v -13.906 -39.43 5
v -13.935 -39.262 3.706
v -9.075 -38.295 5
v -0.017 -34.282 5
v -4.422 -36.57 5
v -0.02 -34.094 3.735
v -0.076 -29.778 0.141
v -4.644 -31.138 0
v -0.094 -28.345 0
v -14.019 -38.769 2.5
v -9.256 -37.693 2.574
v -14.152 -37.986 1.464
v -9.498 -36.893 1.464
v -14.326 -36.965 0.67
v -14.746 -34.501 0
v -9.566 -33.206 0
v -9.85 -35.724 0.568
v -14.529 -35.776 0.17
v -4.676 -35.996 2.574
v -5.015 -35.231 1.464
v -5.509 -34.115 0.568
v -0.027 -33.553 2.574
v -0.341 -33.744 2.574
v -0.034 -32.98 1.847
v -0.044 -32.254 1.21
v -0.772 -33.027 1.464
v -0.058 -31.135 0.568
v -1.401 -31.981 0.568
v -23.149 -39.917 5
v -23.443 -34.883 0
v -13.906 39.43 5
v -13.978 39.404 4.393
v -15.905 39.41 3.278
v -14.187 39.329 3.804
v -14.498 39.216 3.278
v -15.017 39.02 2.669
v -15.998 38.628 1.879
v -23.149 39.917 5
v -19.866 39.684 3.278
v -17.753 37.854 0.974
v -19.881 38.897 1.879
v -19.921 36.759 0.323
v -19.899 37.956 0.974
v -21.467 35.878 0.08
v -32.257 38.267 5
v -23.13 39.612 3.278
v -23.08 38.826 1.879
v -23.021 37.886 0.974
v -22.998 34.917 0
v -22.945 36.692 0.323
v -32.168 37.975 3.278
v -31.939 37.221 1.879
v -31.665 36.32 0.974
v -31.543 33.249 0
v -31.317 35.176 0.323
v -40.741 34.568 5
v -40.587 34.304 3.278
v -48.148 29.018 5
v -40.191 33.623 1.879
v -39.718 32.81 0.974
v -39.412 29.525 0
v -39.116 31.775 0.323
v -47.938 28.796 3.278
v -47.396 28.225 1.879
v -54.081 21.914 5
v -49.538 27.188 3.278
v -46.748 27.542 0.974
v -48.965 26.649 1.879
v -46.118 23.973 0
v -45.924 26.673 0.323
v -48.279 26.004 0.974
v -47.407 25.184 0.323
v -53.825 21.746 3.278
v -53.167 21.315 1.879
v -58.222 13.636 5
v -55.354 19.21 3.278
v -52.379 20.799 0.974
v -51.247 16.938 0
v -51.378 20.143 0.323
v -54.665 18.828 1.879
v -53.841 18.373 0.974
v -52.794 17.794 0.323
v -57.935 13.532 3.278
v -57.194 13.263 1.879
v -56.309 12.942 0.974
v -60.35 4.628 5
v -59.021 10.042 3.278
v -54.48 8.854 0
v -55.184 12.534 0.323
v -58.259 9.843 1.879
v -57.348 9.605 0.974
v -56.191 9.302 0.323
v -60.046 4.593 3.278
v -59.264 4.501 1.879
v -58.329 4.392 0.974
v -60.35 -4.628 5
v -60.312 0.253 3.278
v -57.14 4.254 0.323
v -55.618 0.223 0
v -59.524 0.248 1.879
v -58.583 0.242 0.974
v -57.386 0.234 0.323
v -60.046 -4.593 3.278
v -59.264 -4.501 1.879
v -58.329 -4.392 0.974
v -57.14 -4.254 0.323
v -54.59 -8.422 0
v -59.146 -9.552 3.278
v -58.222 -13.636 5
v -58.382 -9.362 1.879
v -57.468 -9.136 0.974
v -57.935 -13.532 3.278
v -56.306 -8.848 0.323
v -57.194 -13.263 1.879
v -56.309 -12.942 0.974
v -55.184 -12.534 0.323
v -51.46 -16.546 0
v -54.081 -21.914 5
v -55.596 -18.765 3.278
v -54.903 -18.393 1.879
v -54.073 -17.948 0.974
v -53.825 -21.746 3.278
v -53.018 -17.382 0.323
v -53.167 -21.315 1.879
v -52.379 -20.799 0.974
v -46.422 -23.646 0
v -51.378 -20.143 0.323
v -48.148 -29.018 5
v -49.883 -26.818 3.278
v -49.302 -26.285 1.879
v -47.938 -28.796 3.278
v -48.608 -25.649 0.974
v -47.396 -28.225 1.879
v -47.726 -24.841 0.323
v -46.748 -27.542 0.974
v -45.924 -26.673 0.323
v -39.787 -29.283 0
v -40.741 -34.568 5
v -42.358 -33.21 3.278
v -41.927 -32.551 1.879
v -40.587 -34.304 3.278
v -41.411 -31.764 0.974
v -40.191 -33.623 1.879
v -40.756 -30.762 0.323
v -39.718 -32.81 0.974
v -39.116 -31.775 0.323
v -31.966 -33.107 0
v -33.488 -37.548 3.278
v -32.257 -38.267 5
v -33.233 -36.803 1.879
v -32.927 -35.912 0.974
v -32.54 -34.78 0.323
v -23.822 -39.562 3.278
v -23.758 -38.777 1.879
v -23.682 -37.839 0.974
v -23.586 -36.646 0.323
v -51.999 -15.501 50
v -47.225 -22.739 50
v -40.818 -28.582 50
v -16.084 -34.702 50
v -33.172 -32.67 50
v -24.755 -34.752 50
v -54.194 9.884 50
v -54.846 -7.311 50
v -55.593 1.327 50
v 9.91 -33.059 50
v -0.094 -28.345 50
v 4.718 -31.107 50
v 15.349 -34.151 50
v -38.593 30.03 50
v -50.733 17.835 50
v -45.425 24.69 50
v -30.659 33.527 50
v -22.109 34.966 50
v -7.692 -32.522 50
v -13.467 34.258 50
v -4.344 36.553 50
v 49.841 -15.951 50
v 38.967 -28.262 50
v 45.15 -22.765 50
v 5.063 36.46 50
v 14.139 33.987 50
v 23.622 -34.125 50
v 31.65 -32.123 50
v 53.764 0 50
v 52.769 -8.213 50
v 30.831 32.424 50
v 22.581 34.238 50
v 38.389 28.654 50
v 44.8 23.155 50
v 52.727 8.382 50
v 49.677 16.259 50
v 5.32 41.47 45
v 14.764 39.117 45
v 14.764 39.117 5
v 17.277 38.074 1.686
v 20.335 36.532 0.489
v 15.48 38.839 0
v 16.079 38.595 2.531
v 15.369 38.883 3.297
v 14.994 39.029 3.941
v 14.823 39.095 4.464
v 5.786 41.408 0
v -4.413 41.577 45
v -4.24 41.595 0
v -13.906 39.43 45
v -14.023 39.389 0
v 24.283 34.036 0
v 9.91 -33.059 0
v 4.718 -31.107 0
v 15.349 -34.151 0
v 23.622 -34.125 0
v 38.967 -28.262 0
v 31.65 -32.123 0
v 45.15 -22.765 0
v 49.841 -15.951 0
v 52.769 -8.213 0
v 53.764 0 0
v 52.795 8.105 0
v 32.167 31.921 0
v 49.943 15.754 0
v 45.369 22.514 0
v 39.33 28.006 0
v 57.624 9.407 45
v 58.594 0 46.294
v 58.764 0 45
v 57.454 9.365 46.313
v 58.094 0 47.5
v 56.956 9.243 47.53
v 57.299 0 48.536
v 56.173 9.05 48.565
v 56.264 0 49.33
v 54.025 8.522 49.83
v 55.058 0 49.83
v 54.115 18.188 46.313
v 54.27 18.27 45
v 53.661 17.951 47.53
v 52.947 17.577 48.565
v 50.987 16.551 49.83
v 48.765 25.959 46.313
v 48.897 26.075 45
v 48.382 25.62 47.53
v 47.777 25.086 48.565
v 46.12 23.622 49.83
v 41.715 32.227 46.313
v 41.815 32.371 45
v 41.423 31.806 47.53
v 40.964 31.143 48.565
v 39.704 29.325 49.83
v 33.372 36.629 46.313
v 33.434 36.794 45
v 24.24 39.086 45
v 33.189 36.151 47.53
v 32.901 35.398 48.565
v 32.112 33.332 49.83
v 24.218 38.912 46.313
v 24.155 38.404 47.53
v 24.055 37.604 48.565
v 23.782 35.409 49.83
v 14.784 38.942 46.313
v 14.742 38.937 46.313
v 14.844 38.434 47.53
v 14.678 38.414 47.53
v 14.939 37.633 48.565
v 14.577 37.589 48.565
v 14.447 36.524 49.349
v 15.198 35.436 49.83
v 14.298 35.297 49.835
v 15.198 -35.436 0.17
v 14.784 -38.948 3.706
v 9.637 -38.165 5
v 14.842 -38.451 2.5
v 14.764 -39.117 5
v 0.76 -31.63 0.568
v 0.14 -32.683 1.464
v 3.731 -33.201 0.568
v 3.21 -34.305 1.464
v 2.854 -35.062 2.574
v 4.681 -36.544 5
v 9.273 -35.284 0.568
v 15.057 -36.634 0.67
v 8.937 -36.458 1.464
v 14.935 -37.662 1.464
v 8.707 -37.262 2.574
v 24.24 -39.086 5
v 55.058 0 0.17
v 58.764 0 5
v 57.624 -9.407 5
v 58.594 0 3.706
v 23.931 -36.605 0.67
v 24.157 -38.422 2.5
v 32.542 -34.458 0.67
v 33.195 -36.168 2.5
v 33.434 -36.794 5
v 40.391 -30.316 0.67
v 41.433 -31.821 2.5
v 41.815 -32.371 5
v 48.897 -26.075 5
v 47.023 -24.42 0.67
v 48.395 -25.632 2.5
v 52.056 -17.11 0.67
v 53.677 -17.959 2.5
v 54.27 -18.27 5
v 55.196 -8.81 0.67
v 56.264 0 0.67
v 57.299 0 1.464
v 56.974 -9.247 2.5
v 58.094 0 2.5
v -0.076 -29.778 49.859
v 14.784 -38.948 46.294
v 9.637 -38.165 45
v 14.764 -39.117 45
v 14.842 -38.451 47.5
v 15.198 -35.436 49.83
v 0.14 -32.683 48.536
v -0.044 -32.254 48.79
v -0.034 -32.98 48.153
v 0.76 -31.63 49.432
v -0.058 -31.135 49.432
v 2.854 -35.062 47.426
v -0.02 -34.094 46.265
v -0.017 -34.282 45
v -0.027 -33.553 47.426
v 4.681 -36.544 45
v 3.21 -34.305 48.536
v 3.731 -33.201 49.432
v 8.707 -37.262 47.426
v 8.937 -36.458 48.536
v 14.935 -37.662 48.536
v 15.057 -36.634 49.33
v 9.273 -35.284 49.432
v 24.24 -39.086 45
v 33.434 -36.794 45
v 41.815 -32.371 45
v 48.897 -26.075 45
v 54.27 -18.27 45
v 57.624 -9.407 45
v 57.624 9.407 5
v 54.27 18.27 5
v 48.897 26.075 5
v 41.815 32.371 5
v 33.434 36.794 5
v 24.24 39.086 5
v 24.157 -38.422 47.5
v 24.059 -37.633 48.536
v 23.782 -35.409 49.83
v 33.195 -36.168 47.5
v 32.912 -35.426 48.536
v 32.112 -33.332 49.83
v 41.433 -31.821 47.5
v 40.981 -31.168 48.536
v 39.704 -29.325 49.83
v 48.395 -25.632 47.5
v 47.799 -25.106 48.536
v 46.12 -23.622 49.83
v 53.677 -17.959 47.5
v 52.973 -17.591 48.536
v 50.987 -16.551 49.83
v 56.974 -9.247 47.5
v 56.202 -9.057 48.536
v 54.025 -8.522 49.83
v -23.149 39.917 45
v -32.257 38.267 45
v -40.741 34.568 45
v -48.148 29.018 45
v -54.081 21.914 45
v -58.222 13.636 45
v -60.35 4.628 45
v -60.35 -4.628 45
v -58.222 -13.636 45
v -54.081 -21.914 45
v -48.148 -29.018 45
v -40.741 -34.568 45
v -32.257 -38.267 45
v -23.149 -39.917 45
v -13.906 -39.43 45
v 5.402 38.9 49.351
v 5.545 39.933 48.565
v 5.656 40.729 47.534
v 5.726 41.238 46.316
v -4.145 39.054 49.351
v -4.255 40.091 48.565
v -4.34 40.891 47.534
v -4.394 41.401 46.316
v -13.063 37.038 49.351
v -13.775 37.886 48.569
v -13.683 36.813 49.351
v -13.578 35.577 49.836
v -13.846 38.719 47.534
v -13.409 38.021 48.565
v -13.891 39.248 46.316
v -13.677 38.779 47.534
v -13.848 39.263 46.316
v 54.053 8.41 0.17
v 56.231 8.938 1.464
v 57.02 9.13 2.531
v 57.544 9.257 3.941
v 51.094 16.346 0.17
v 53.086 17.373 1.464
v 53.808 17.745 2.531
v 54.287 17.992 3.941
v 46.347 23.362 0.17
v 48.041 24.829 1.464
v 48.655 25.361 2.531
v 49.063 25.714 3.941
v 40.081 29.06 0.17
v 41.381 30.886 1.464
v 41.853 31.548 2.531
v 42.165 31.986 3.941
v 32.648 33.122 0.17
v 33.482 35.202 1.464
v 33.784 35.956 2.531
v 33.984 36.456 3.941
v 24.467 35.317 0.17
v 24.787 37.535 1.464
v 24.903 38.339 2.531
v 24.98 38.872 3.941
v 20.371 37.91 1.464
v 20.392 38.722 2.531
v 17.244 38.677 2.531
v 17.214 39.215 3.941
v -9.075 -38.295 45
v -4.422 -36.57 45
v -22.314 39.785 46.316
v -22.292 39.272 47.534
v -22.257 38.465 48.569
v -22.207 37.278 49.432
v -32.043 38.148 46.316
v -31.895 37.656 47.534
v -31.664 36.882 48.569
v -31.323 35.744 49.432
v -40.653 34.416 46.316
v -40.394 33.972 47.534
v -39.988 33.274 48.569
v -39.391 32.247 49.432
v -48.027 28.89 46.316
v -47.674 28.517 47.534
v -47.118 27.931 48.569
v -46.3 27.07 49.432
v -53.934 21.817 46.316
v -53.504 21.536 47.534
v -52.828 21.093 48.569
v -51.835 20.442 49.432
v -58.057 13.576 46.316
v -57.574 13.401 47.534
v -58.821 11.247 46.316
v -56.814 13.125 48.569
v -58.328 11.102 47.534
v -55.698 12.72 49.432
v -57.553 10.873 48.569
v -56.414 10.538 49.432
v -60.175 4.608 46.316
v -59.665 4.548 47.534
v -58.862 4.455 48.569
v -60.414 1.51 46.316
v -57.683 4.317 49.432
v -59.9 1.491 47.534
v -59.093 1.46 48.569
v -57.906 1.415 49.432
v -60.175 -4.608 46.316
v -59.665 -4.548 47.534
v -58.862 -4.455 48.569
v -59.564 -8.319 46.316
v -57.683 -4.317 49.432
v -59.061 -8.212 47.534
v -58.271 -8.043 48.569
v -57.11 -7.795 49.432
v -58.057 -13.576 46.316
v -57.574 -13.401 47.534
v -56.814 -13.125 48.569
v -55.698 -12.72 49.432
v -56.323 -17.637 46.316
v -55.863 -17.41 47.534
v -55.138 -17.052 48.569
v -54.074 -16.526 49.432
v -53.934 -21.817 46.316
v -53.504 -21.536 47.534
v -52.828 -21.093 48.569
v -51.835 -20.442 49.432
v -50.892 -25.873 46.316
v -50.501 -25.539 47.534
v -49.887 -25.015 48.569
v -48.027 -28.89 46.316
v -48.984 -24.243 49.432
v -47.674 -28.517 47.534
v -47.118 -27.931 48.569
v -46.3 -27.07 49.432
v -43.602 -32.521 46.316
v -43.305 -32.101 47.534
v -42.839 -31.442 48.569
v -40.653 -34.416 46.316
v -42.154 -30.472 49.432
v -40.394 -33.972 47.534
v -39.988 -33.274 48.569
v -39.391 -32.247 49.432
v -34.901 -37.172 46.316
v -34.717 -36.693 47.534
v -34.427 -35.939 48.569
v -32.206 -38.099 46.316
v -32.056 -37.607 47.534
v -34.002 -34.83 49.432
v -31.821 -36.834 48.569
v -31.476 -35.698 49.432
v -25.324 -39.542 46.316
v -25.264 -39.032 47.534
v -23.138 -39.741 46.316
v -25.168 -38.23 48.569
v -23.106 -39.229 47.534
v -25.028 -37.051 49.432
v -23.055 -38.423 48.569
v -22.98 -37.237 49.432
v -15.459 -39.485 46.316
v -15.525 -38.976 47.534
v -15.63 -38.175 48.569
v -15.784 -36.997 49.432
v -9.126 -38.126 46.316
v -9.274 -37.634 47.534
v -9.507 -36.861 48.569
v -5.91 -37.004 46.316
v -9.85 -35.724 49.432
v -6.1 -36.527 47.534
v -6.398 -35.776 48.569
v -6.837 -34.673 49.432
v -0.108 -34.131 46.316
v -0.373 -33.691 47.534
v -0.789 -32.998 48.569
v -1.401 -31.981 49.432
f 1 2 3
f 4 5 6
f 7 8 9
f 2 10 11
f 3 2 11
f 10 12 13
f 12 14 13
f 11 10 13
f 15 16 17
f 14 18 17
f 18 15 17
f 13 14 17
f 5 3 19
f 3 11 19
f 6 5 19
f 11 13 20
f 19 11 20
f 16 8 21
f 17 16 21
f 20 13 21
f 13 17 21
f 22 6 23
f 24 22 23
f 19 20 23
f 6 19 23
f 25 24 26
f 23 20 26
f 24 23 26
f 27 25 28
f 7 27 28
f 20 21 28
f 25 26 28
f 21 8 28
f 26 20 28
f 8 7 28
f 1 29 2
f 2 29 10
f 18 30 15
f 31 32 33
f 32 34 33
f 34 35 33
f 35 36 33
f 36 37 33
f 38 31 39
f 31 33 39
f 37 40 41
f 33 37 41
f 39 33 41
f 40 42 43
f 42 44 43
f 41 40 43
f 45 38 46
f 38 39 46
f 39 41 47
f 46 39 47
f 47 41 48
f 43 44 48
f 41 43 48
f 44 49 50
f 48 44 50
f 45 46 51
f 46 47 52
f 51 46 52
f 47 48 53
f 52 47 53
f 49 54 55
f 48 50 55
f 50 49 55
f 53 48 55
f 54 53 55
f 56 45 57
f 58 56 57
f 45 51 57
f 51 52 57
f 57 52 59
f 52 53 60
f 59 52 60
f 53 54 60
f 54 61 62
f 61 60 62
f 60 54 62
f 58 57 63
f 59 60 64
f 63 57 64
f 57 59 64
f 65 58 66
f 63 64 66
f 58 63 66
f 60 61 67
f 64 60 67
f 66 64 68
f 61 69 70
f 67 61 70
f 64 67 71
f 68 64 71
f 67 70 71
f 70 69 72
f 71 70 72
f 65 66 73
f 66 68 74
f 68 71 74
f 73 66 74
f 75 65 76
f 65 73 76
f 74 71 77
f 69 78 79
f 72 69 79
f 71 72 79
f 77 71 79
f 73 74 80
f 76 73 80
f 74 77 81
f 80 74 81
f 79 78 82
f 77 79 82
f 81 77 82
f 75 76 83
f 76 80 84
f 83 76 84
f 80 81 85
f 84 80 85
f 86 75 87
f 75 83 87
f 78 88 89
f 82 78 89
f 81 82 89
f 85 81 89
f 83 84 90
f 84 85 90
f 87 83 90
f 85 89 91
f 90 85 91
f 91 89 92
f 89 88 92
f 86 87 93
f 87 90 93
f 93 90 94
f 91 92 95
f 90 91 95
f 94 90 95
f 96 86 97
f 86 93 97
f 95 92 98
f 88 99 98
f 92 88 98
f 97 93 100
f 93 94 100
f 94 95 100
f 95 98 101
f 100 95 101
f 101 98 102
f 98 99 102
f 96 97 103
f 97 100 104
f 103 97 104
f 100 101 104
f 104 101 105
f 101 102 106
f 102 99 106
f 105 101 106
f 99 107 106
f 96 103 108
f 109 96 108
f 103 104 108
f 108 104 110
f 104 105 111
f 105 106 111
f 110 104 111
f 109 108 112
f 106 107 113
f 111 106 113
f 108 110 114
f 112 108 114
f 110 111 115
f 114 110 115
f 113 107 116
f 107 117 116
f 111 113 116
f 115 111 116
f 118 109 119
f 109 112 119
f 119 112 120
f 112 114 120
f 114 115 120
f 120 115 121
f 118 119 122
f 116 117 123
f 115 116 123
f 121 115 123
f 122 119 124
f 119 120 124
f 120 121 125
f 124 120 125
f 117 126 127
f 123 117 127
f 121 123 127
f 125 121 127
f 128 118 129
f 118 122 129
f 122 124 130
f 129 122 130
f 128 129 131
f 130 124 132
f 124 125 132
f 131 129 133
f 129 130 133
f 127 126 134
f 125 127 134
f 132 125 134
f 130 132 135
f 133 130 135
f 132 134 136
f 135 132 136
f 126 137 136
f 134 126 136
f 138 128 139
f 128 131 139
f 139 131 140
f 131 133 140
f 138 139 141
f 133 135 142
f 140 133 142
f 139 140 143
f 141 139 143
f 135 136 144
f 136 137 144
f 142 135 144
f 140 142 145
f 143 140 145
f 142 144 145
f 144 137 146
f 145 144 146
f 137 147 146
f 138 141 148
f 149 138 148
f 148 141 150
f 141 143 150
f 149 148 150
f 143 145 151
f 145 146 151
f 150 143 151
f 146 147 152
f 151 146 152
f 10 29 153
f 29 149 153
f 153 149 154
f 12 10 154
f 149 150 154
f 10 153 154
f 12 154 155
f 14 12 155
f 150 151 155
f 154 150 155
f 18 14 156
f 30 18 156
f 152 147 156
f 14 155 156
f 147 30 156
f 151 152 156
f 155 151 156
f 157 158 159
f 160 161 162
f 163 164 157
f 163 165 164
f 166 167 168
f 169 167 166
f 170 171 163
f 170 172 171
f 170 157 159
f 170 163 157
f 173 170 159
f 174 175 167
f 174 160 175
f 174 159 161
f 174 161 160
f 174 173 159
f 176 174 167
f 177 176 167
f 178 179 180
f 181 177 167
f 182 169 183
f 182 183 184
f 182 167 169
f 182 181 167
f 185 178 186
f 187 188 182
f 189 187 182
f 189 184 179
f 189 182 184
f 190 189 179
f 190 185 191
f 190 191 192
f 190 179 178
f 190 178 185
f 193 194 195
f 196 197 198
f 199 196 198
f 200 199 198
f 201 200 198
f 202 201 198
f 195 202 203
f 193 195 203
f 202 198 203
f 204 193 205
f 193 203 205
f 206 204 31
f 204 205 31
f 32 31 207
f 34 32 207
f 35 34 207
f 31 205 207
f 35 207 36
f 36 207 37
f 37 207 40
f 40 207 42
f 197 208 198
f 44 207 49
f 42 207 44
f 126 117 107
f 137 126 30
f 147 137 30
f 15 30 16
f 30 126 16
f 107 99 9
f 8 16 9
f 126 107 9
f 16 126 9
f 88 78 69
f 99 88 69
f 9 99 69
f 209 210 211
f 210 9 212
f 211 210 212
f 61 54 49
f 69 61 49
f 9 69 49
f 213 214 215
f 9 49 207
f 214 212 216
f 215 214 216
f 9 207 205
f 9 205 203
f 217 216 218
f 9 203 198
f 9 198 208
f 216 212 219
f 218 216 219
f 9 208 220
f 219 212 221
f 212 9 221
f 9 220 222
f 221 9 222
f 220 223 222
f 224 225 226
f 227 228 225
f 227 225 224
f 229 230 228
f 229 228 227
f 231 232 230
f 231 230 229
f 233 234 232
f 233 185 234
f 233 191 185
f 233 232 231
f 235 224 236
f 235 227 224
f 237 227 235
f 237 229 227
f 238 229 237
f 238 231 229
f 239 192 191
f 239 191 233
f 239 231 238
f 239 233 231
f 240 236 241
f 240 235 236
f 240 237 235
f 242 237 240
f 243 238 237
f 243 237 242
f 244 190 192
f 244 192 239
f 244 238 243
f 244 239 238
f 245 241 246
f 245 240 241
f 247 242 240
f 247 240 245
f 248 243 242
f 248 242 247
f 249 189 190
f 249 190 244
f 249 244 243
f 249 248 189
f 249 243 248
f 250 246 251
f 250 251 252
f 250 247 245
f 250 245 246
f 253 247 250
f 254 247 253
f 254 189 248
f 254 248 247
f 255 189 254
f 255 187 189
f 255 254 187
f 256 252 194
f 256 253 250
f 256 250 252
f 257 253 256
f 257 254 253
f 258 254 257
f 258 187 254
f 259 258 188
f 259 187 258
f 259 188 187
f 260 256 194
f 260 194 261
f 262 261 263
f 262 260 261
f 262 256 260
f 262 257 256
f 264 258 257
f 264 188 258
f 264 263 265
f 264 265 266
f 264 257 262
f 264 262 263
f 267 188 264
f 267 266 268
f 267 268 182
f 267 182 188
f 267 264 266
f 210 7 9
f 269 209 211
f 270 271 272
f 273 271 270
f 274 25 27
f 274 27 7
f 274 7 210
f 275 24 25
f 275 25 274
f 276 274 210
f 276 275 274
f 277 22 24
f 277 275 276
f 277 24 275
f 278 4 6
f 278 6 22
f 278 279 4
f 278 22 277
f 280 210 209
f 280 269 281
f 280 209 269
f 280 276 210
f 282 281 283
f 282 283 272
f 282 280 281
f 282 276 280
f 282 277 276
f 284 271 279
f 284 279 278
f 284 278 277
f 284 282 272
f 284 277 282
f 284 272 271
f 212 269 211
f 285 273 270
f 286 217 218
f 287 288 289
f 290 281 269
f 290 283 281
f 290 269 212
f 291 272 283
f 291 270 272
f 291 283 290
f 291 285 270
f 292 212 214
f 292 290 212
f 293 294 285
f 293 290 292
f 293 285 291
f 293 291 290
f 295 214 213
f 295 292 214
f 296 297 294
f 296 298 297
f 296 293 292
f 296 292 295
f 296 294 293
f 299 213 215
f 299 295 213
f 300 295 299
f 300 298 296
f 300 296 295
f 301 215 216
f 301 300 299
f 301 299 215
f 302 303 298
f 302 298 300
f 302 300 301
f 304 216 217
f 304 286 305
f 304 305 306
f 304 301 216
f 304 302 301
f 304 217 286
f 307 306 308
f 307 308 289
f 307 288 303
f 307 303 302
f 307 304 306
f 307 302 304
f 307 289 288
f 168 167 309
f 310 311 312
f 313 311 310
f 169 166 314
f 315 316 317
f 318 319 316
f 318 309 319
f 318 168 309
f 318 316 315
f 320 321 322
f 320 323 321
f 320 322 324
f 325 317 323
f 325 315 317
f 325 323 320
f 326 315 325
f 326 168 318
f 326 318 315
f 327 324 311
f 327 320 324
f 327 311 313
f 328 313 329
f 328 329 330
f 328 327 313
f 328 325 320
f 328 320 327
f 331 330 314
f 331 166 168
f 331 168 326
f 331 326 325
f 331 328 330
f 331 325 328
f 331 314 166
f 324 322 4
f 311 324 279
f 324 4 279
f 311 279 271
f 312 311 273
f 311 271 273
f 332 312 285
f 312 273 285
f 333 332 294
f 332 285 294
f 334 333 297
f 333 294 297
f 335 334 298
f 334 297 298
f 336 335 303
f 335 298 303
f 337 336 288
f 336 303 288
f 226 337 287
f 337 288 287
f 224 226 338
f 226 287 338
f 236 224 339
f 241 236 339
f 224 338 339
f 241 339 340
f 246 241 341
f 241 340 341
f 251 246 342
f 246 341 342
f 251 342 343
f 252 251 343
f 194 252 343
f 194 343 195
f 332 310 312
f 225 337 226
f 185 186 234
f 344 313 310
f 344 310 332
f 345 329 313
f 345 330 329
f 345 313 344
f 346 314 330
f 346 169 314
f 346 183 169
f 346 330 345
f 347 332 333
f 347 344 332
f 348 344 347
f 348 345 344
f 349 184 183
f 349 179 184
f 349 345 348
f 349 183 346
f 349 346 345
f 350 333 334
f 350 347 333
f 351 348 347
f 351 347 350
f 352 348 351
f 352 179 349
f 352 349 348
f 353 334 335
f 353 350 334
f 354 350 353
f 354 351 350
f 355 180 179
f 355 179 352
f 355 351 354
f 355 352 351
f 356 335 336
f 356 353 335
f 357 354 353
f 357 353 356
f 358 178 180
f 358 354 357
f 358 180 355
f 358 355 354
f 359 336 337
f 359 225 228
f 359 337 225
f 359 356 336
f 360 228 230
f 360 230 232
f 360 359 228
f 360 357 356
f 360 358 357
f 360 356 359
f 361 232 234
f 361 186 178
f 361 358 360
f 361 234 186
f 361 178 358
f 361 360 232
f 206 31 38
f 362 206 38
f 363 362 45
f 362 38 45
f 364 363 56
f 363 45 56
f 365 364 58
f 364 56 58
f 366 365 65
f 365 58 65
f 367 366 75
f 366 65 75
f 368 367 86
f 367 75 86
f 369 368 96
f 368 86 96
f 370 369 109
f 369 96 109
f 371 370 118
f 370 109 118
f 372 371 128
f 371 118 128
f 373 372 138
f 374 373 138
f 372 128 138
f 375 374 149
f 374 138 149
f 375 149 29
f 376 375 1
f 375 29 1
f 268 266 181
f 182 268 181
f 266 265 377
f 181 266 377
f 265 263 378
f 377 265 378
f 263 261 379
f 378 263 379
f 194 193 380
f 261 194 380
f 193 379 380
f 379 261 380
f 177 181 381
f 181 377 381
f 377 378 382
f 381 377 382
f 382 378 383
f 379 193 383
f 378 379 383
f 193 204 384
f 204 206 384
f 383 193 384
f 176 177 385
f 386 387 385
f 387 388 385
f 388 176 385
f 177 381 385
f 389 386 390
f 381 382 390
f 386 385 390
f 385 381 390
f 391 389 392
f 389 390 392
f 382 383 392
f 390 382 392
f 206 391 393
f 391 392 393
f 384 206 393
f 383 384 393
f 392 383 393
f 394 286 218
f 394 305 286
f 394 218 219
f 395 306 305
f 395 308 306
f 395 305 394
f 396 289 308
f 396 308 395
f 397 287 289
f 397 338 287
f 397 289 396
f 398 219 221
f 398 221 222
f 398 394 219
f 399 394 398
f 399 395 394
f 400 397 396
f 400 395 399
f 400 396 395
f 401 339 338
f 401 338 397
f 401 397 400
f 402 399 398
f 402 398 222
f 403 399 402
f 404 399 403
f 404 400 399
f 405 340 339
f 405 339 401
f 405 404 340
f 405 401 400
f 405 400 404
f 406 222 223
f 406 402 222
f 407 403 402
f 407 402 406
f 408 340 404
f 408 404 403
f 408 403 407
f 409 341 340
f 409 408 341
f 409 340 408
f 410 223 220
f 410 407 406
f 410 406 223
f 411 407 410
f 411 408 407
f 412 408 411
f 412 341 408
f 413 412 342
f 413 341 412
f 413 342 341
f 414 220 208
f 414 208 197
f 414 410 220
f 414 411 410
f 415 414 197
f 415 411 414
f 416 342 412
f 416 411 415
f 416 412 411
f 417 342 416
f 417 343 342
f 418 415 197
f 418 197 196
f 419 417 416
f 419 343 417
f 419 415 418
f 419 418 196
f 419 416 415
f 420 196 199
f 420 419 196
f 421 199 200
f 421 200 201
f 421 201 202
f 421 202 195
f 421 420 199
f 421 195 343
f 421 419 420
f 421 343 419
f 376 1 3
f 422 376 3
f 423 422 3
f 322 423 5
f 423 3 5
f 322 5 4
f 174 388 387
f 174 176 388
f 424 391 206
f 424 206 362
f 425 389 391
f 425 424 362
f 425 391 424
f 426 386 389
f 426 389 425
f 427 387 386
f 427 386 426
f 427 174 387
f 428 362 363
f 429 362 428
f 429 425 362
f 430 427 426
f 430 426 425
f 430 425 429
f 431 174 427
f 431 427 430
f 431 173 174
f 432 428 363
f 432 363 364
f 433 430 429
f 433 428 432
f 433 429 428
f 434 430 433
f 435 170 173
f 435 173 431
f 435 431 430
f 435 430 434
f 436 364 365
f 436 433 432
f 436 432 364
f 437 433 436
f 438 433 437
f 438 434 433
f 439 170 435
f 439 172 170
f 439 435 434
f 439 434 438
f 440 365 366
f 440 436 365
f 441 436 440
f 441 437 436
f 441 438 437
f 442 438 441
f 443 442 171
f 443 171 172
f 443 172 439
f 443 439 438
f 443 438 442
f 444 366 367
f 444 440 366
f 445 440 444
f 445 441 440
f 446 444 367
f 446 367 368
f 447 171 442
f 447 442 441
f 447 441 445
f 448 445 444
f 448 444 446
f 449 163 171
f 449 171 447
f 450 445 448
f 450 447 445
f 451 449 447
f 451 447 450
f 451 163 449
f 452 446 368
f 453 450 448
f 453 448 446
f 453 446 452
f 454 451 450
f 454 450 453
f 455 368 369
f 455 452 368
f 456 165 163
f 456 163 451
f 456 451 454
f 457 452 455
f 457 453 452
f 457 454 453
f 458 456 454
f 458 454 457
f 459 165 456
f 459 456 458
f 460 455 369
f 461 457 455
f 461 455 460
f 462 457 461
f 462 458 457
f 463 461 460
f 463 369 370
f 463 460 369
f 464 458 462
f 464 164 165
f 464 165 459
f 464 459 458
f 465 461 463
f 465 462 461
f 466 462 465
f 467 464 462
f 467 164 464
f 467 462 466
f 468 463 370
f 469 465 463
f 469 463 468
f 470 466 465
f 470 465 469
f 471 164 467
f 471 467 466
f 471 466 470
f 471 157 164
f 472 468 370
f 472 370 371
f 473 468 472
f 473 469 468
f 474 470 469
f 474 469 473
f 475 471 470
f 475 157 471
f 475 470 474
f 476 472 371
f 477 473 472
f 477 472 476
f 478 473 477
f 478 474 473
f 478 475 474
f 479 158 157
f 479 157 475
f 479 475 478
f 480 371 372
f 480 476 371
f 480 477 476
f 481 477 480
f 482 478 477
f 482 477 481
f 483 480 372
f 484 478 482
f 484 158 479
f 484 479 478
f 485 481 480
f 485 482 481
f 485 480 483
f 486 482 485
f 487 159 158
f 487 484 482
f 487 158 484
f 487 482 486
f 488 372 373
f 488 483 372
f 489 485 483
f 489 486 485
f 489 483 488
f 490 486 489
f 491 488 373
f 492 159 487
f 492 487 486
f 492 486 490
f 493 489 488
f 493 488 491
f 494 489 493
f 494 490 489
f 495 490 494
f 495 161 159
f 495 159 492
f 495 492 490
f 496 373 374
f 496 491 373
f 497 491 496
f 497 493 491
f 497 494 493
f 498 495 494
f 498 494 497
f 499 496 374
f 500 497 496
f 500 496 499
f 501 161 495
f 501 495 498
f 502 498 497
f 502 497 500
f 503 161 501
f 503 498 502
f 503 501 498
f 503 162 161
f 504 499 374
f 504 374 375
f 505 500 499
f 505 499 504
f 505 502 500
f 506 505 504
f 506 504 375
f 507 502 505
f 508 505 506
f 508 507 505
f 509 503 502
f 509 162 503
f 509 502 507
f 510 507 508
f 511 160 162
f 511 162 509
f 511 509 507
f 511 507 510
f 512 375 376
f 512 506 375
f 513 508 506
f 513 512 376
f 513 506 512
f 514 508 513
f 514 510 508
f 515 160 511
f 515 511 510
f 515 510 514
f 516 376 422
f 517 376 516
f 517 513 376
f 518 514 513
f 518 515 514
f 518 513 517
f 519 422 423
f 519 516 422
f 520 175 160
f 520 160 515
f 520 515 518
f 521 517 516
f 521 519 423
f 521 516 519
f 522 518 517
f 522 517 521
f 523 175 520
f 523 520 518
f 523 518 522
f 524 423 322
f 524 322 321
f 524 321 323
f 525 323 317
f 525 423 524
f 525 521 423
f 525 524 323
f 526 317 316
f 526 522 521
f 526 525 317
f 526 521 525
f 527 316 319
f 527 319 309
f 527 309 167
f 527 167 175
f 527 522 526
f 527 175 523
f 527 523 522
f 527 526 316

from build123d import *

# Parameters (mm, degrees)
F1_DEPTH = 25
F2_DEPTH = 25
F3_R     = 5


with BuildPart() as f1:
    # F0 (on Top) → F1 (new body)
    with BuildSketch(Plane.XY):
        with BuildLine():
            ThreePointArc((-13.9063807078, -39.4297258268), (-41.8101746369, 0), (-13.9063807078, 39.4297258268))
            ThreePointArc((-13.9063807078, 39.4297258268), (-60.6185237596, 0), (-13.9063807078, -39.4297258268))
        make_face()
        with BuildLine():
            ThreePointArc((-0.0174014932, 34.2823190322), (-6.7215345173, 37.5045640586), (-13.9063807078, 39.4297258268))
            ThreePointArc((-13.9063807078, 39.4297258268), (-41.8101746369, 0), (-13.9063807078, -39.4297258268))
            ThreePointArc((-13.9063807078, -39.4297258268), (-6.7215345173, -37.5045640586), (-0.0174014932, -34.2823190322))
            ThreePointArc((-0.0174014932, -34.2823190322), (-20.0114496486, 0), (-0.0174014932, 34.2823190322))
        make_face()
        with BuildLine():
            ThreePointArc((19.3762558232, 0), (14.1918428442, 19.6938527359), (-0.0174014932, 34.2823190322))
            ThreePointArc((-0.0174014932, 34.2823190322), (-20.0114496486, 0), (-0.0174014932, -34.2823190322))
            ThreePointArc((-0.0174014932, -34.2823190322), (14.1918428442, -19.6938527359), (19.3762558232, 0))
        make_face()
        with BuildLine():
            ThreePointArc((14.7639114539, -39.1167179317), (34.3902051417, -23.7782357099), (41.8101746369, 0))
            ThreePointArc((41.8101746369, 0), (34.3902051417, 23.7782357099), (14.7639114539, 39.1167179317))
            ThreePointArc((14.7639114539, 39.1167179317), (7.1322825133, 37.4362986941), (-0.0174014932, 34.2823190322))
            ThreePointArc((-0.0174014932, 34.2823190322), (14.1918428442, 19.6938527359), (19.3762558232, 0))
            ThreePointArc((19.3762558232, 0), (14.1918428442, -19.6938527359), (-0.0174014932, -34.2823190322))
            ThreePointArc((-0.0174014932, -34.2823190322), (7.1322825133, -37.4362986941), (14.7639114539, -39.1167179317))
        make_face()
        with BuildLine():
            ThreePointArc((14.7639114539, 39.1167179317), (34.3902051417, 23.7782357099), (41.8101746369, 0))
            ThreePointArc((41.8101746369, 0), (34.3902051417, -23.7782357099), (14.7639114539, -39.1167179317))
            ThreePointArc((14.7639114539, -39.1167179317), (45.546101837, -29.436890154), (58.7639612949, 0))
            ThreePointArc((58.7639612949, 0), (45.546101837, 29.436890154), (14.7639114539, 39.1167179317))
        make_face()
        with BuildLine():
            ThreePointArc((-0.0174014932, 34.2823190322), (7.1322825133, 37.4362986941), (14.7639114539, 39.1167179317))
            ThreePointArc((14.7639114539, 39.1167179317), (0.4564353522, 41.8076831448), (-13.9063807078, 39.4297258268))
            ThreePointArc((-13.9063807078, 39.4297258268), (-6.7215345173, 37.5045640586), (-0.0174014932, 34.2823190322))
        make_face()
    extrude(amount=F1_DEPTH)

    # F2 (add): a face of the model
    f2_faces = [f1.faces().sort_by_distance(p)[0] for p in [
        (-1.0668133748, 0.5074400714, 25),
    ]]
    extrude(f2_faces, amount=F2_DEPTH)

    # F3
    f3_edges = [f1.edges().sort_by_distance(p)[0] for p in [
        (57.988776, -7.775902, 50),
        (-59.926875, -7.406071, 50),
        (0.456435, 41.807683, 50),
        (-59.926875, -7.406071, 0),
        (57.988776, -7.775902, 0),
    ]]
    fillet(f3_edges, radius=F3_R)


solid = f1.part
